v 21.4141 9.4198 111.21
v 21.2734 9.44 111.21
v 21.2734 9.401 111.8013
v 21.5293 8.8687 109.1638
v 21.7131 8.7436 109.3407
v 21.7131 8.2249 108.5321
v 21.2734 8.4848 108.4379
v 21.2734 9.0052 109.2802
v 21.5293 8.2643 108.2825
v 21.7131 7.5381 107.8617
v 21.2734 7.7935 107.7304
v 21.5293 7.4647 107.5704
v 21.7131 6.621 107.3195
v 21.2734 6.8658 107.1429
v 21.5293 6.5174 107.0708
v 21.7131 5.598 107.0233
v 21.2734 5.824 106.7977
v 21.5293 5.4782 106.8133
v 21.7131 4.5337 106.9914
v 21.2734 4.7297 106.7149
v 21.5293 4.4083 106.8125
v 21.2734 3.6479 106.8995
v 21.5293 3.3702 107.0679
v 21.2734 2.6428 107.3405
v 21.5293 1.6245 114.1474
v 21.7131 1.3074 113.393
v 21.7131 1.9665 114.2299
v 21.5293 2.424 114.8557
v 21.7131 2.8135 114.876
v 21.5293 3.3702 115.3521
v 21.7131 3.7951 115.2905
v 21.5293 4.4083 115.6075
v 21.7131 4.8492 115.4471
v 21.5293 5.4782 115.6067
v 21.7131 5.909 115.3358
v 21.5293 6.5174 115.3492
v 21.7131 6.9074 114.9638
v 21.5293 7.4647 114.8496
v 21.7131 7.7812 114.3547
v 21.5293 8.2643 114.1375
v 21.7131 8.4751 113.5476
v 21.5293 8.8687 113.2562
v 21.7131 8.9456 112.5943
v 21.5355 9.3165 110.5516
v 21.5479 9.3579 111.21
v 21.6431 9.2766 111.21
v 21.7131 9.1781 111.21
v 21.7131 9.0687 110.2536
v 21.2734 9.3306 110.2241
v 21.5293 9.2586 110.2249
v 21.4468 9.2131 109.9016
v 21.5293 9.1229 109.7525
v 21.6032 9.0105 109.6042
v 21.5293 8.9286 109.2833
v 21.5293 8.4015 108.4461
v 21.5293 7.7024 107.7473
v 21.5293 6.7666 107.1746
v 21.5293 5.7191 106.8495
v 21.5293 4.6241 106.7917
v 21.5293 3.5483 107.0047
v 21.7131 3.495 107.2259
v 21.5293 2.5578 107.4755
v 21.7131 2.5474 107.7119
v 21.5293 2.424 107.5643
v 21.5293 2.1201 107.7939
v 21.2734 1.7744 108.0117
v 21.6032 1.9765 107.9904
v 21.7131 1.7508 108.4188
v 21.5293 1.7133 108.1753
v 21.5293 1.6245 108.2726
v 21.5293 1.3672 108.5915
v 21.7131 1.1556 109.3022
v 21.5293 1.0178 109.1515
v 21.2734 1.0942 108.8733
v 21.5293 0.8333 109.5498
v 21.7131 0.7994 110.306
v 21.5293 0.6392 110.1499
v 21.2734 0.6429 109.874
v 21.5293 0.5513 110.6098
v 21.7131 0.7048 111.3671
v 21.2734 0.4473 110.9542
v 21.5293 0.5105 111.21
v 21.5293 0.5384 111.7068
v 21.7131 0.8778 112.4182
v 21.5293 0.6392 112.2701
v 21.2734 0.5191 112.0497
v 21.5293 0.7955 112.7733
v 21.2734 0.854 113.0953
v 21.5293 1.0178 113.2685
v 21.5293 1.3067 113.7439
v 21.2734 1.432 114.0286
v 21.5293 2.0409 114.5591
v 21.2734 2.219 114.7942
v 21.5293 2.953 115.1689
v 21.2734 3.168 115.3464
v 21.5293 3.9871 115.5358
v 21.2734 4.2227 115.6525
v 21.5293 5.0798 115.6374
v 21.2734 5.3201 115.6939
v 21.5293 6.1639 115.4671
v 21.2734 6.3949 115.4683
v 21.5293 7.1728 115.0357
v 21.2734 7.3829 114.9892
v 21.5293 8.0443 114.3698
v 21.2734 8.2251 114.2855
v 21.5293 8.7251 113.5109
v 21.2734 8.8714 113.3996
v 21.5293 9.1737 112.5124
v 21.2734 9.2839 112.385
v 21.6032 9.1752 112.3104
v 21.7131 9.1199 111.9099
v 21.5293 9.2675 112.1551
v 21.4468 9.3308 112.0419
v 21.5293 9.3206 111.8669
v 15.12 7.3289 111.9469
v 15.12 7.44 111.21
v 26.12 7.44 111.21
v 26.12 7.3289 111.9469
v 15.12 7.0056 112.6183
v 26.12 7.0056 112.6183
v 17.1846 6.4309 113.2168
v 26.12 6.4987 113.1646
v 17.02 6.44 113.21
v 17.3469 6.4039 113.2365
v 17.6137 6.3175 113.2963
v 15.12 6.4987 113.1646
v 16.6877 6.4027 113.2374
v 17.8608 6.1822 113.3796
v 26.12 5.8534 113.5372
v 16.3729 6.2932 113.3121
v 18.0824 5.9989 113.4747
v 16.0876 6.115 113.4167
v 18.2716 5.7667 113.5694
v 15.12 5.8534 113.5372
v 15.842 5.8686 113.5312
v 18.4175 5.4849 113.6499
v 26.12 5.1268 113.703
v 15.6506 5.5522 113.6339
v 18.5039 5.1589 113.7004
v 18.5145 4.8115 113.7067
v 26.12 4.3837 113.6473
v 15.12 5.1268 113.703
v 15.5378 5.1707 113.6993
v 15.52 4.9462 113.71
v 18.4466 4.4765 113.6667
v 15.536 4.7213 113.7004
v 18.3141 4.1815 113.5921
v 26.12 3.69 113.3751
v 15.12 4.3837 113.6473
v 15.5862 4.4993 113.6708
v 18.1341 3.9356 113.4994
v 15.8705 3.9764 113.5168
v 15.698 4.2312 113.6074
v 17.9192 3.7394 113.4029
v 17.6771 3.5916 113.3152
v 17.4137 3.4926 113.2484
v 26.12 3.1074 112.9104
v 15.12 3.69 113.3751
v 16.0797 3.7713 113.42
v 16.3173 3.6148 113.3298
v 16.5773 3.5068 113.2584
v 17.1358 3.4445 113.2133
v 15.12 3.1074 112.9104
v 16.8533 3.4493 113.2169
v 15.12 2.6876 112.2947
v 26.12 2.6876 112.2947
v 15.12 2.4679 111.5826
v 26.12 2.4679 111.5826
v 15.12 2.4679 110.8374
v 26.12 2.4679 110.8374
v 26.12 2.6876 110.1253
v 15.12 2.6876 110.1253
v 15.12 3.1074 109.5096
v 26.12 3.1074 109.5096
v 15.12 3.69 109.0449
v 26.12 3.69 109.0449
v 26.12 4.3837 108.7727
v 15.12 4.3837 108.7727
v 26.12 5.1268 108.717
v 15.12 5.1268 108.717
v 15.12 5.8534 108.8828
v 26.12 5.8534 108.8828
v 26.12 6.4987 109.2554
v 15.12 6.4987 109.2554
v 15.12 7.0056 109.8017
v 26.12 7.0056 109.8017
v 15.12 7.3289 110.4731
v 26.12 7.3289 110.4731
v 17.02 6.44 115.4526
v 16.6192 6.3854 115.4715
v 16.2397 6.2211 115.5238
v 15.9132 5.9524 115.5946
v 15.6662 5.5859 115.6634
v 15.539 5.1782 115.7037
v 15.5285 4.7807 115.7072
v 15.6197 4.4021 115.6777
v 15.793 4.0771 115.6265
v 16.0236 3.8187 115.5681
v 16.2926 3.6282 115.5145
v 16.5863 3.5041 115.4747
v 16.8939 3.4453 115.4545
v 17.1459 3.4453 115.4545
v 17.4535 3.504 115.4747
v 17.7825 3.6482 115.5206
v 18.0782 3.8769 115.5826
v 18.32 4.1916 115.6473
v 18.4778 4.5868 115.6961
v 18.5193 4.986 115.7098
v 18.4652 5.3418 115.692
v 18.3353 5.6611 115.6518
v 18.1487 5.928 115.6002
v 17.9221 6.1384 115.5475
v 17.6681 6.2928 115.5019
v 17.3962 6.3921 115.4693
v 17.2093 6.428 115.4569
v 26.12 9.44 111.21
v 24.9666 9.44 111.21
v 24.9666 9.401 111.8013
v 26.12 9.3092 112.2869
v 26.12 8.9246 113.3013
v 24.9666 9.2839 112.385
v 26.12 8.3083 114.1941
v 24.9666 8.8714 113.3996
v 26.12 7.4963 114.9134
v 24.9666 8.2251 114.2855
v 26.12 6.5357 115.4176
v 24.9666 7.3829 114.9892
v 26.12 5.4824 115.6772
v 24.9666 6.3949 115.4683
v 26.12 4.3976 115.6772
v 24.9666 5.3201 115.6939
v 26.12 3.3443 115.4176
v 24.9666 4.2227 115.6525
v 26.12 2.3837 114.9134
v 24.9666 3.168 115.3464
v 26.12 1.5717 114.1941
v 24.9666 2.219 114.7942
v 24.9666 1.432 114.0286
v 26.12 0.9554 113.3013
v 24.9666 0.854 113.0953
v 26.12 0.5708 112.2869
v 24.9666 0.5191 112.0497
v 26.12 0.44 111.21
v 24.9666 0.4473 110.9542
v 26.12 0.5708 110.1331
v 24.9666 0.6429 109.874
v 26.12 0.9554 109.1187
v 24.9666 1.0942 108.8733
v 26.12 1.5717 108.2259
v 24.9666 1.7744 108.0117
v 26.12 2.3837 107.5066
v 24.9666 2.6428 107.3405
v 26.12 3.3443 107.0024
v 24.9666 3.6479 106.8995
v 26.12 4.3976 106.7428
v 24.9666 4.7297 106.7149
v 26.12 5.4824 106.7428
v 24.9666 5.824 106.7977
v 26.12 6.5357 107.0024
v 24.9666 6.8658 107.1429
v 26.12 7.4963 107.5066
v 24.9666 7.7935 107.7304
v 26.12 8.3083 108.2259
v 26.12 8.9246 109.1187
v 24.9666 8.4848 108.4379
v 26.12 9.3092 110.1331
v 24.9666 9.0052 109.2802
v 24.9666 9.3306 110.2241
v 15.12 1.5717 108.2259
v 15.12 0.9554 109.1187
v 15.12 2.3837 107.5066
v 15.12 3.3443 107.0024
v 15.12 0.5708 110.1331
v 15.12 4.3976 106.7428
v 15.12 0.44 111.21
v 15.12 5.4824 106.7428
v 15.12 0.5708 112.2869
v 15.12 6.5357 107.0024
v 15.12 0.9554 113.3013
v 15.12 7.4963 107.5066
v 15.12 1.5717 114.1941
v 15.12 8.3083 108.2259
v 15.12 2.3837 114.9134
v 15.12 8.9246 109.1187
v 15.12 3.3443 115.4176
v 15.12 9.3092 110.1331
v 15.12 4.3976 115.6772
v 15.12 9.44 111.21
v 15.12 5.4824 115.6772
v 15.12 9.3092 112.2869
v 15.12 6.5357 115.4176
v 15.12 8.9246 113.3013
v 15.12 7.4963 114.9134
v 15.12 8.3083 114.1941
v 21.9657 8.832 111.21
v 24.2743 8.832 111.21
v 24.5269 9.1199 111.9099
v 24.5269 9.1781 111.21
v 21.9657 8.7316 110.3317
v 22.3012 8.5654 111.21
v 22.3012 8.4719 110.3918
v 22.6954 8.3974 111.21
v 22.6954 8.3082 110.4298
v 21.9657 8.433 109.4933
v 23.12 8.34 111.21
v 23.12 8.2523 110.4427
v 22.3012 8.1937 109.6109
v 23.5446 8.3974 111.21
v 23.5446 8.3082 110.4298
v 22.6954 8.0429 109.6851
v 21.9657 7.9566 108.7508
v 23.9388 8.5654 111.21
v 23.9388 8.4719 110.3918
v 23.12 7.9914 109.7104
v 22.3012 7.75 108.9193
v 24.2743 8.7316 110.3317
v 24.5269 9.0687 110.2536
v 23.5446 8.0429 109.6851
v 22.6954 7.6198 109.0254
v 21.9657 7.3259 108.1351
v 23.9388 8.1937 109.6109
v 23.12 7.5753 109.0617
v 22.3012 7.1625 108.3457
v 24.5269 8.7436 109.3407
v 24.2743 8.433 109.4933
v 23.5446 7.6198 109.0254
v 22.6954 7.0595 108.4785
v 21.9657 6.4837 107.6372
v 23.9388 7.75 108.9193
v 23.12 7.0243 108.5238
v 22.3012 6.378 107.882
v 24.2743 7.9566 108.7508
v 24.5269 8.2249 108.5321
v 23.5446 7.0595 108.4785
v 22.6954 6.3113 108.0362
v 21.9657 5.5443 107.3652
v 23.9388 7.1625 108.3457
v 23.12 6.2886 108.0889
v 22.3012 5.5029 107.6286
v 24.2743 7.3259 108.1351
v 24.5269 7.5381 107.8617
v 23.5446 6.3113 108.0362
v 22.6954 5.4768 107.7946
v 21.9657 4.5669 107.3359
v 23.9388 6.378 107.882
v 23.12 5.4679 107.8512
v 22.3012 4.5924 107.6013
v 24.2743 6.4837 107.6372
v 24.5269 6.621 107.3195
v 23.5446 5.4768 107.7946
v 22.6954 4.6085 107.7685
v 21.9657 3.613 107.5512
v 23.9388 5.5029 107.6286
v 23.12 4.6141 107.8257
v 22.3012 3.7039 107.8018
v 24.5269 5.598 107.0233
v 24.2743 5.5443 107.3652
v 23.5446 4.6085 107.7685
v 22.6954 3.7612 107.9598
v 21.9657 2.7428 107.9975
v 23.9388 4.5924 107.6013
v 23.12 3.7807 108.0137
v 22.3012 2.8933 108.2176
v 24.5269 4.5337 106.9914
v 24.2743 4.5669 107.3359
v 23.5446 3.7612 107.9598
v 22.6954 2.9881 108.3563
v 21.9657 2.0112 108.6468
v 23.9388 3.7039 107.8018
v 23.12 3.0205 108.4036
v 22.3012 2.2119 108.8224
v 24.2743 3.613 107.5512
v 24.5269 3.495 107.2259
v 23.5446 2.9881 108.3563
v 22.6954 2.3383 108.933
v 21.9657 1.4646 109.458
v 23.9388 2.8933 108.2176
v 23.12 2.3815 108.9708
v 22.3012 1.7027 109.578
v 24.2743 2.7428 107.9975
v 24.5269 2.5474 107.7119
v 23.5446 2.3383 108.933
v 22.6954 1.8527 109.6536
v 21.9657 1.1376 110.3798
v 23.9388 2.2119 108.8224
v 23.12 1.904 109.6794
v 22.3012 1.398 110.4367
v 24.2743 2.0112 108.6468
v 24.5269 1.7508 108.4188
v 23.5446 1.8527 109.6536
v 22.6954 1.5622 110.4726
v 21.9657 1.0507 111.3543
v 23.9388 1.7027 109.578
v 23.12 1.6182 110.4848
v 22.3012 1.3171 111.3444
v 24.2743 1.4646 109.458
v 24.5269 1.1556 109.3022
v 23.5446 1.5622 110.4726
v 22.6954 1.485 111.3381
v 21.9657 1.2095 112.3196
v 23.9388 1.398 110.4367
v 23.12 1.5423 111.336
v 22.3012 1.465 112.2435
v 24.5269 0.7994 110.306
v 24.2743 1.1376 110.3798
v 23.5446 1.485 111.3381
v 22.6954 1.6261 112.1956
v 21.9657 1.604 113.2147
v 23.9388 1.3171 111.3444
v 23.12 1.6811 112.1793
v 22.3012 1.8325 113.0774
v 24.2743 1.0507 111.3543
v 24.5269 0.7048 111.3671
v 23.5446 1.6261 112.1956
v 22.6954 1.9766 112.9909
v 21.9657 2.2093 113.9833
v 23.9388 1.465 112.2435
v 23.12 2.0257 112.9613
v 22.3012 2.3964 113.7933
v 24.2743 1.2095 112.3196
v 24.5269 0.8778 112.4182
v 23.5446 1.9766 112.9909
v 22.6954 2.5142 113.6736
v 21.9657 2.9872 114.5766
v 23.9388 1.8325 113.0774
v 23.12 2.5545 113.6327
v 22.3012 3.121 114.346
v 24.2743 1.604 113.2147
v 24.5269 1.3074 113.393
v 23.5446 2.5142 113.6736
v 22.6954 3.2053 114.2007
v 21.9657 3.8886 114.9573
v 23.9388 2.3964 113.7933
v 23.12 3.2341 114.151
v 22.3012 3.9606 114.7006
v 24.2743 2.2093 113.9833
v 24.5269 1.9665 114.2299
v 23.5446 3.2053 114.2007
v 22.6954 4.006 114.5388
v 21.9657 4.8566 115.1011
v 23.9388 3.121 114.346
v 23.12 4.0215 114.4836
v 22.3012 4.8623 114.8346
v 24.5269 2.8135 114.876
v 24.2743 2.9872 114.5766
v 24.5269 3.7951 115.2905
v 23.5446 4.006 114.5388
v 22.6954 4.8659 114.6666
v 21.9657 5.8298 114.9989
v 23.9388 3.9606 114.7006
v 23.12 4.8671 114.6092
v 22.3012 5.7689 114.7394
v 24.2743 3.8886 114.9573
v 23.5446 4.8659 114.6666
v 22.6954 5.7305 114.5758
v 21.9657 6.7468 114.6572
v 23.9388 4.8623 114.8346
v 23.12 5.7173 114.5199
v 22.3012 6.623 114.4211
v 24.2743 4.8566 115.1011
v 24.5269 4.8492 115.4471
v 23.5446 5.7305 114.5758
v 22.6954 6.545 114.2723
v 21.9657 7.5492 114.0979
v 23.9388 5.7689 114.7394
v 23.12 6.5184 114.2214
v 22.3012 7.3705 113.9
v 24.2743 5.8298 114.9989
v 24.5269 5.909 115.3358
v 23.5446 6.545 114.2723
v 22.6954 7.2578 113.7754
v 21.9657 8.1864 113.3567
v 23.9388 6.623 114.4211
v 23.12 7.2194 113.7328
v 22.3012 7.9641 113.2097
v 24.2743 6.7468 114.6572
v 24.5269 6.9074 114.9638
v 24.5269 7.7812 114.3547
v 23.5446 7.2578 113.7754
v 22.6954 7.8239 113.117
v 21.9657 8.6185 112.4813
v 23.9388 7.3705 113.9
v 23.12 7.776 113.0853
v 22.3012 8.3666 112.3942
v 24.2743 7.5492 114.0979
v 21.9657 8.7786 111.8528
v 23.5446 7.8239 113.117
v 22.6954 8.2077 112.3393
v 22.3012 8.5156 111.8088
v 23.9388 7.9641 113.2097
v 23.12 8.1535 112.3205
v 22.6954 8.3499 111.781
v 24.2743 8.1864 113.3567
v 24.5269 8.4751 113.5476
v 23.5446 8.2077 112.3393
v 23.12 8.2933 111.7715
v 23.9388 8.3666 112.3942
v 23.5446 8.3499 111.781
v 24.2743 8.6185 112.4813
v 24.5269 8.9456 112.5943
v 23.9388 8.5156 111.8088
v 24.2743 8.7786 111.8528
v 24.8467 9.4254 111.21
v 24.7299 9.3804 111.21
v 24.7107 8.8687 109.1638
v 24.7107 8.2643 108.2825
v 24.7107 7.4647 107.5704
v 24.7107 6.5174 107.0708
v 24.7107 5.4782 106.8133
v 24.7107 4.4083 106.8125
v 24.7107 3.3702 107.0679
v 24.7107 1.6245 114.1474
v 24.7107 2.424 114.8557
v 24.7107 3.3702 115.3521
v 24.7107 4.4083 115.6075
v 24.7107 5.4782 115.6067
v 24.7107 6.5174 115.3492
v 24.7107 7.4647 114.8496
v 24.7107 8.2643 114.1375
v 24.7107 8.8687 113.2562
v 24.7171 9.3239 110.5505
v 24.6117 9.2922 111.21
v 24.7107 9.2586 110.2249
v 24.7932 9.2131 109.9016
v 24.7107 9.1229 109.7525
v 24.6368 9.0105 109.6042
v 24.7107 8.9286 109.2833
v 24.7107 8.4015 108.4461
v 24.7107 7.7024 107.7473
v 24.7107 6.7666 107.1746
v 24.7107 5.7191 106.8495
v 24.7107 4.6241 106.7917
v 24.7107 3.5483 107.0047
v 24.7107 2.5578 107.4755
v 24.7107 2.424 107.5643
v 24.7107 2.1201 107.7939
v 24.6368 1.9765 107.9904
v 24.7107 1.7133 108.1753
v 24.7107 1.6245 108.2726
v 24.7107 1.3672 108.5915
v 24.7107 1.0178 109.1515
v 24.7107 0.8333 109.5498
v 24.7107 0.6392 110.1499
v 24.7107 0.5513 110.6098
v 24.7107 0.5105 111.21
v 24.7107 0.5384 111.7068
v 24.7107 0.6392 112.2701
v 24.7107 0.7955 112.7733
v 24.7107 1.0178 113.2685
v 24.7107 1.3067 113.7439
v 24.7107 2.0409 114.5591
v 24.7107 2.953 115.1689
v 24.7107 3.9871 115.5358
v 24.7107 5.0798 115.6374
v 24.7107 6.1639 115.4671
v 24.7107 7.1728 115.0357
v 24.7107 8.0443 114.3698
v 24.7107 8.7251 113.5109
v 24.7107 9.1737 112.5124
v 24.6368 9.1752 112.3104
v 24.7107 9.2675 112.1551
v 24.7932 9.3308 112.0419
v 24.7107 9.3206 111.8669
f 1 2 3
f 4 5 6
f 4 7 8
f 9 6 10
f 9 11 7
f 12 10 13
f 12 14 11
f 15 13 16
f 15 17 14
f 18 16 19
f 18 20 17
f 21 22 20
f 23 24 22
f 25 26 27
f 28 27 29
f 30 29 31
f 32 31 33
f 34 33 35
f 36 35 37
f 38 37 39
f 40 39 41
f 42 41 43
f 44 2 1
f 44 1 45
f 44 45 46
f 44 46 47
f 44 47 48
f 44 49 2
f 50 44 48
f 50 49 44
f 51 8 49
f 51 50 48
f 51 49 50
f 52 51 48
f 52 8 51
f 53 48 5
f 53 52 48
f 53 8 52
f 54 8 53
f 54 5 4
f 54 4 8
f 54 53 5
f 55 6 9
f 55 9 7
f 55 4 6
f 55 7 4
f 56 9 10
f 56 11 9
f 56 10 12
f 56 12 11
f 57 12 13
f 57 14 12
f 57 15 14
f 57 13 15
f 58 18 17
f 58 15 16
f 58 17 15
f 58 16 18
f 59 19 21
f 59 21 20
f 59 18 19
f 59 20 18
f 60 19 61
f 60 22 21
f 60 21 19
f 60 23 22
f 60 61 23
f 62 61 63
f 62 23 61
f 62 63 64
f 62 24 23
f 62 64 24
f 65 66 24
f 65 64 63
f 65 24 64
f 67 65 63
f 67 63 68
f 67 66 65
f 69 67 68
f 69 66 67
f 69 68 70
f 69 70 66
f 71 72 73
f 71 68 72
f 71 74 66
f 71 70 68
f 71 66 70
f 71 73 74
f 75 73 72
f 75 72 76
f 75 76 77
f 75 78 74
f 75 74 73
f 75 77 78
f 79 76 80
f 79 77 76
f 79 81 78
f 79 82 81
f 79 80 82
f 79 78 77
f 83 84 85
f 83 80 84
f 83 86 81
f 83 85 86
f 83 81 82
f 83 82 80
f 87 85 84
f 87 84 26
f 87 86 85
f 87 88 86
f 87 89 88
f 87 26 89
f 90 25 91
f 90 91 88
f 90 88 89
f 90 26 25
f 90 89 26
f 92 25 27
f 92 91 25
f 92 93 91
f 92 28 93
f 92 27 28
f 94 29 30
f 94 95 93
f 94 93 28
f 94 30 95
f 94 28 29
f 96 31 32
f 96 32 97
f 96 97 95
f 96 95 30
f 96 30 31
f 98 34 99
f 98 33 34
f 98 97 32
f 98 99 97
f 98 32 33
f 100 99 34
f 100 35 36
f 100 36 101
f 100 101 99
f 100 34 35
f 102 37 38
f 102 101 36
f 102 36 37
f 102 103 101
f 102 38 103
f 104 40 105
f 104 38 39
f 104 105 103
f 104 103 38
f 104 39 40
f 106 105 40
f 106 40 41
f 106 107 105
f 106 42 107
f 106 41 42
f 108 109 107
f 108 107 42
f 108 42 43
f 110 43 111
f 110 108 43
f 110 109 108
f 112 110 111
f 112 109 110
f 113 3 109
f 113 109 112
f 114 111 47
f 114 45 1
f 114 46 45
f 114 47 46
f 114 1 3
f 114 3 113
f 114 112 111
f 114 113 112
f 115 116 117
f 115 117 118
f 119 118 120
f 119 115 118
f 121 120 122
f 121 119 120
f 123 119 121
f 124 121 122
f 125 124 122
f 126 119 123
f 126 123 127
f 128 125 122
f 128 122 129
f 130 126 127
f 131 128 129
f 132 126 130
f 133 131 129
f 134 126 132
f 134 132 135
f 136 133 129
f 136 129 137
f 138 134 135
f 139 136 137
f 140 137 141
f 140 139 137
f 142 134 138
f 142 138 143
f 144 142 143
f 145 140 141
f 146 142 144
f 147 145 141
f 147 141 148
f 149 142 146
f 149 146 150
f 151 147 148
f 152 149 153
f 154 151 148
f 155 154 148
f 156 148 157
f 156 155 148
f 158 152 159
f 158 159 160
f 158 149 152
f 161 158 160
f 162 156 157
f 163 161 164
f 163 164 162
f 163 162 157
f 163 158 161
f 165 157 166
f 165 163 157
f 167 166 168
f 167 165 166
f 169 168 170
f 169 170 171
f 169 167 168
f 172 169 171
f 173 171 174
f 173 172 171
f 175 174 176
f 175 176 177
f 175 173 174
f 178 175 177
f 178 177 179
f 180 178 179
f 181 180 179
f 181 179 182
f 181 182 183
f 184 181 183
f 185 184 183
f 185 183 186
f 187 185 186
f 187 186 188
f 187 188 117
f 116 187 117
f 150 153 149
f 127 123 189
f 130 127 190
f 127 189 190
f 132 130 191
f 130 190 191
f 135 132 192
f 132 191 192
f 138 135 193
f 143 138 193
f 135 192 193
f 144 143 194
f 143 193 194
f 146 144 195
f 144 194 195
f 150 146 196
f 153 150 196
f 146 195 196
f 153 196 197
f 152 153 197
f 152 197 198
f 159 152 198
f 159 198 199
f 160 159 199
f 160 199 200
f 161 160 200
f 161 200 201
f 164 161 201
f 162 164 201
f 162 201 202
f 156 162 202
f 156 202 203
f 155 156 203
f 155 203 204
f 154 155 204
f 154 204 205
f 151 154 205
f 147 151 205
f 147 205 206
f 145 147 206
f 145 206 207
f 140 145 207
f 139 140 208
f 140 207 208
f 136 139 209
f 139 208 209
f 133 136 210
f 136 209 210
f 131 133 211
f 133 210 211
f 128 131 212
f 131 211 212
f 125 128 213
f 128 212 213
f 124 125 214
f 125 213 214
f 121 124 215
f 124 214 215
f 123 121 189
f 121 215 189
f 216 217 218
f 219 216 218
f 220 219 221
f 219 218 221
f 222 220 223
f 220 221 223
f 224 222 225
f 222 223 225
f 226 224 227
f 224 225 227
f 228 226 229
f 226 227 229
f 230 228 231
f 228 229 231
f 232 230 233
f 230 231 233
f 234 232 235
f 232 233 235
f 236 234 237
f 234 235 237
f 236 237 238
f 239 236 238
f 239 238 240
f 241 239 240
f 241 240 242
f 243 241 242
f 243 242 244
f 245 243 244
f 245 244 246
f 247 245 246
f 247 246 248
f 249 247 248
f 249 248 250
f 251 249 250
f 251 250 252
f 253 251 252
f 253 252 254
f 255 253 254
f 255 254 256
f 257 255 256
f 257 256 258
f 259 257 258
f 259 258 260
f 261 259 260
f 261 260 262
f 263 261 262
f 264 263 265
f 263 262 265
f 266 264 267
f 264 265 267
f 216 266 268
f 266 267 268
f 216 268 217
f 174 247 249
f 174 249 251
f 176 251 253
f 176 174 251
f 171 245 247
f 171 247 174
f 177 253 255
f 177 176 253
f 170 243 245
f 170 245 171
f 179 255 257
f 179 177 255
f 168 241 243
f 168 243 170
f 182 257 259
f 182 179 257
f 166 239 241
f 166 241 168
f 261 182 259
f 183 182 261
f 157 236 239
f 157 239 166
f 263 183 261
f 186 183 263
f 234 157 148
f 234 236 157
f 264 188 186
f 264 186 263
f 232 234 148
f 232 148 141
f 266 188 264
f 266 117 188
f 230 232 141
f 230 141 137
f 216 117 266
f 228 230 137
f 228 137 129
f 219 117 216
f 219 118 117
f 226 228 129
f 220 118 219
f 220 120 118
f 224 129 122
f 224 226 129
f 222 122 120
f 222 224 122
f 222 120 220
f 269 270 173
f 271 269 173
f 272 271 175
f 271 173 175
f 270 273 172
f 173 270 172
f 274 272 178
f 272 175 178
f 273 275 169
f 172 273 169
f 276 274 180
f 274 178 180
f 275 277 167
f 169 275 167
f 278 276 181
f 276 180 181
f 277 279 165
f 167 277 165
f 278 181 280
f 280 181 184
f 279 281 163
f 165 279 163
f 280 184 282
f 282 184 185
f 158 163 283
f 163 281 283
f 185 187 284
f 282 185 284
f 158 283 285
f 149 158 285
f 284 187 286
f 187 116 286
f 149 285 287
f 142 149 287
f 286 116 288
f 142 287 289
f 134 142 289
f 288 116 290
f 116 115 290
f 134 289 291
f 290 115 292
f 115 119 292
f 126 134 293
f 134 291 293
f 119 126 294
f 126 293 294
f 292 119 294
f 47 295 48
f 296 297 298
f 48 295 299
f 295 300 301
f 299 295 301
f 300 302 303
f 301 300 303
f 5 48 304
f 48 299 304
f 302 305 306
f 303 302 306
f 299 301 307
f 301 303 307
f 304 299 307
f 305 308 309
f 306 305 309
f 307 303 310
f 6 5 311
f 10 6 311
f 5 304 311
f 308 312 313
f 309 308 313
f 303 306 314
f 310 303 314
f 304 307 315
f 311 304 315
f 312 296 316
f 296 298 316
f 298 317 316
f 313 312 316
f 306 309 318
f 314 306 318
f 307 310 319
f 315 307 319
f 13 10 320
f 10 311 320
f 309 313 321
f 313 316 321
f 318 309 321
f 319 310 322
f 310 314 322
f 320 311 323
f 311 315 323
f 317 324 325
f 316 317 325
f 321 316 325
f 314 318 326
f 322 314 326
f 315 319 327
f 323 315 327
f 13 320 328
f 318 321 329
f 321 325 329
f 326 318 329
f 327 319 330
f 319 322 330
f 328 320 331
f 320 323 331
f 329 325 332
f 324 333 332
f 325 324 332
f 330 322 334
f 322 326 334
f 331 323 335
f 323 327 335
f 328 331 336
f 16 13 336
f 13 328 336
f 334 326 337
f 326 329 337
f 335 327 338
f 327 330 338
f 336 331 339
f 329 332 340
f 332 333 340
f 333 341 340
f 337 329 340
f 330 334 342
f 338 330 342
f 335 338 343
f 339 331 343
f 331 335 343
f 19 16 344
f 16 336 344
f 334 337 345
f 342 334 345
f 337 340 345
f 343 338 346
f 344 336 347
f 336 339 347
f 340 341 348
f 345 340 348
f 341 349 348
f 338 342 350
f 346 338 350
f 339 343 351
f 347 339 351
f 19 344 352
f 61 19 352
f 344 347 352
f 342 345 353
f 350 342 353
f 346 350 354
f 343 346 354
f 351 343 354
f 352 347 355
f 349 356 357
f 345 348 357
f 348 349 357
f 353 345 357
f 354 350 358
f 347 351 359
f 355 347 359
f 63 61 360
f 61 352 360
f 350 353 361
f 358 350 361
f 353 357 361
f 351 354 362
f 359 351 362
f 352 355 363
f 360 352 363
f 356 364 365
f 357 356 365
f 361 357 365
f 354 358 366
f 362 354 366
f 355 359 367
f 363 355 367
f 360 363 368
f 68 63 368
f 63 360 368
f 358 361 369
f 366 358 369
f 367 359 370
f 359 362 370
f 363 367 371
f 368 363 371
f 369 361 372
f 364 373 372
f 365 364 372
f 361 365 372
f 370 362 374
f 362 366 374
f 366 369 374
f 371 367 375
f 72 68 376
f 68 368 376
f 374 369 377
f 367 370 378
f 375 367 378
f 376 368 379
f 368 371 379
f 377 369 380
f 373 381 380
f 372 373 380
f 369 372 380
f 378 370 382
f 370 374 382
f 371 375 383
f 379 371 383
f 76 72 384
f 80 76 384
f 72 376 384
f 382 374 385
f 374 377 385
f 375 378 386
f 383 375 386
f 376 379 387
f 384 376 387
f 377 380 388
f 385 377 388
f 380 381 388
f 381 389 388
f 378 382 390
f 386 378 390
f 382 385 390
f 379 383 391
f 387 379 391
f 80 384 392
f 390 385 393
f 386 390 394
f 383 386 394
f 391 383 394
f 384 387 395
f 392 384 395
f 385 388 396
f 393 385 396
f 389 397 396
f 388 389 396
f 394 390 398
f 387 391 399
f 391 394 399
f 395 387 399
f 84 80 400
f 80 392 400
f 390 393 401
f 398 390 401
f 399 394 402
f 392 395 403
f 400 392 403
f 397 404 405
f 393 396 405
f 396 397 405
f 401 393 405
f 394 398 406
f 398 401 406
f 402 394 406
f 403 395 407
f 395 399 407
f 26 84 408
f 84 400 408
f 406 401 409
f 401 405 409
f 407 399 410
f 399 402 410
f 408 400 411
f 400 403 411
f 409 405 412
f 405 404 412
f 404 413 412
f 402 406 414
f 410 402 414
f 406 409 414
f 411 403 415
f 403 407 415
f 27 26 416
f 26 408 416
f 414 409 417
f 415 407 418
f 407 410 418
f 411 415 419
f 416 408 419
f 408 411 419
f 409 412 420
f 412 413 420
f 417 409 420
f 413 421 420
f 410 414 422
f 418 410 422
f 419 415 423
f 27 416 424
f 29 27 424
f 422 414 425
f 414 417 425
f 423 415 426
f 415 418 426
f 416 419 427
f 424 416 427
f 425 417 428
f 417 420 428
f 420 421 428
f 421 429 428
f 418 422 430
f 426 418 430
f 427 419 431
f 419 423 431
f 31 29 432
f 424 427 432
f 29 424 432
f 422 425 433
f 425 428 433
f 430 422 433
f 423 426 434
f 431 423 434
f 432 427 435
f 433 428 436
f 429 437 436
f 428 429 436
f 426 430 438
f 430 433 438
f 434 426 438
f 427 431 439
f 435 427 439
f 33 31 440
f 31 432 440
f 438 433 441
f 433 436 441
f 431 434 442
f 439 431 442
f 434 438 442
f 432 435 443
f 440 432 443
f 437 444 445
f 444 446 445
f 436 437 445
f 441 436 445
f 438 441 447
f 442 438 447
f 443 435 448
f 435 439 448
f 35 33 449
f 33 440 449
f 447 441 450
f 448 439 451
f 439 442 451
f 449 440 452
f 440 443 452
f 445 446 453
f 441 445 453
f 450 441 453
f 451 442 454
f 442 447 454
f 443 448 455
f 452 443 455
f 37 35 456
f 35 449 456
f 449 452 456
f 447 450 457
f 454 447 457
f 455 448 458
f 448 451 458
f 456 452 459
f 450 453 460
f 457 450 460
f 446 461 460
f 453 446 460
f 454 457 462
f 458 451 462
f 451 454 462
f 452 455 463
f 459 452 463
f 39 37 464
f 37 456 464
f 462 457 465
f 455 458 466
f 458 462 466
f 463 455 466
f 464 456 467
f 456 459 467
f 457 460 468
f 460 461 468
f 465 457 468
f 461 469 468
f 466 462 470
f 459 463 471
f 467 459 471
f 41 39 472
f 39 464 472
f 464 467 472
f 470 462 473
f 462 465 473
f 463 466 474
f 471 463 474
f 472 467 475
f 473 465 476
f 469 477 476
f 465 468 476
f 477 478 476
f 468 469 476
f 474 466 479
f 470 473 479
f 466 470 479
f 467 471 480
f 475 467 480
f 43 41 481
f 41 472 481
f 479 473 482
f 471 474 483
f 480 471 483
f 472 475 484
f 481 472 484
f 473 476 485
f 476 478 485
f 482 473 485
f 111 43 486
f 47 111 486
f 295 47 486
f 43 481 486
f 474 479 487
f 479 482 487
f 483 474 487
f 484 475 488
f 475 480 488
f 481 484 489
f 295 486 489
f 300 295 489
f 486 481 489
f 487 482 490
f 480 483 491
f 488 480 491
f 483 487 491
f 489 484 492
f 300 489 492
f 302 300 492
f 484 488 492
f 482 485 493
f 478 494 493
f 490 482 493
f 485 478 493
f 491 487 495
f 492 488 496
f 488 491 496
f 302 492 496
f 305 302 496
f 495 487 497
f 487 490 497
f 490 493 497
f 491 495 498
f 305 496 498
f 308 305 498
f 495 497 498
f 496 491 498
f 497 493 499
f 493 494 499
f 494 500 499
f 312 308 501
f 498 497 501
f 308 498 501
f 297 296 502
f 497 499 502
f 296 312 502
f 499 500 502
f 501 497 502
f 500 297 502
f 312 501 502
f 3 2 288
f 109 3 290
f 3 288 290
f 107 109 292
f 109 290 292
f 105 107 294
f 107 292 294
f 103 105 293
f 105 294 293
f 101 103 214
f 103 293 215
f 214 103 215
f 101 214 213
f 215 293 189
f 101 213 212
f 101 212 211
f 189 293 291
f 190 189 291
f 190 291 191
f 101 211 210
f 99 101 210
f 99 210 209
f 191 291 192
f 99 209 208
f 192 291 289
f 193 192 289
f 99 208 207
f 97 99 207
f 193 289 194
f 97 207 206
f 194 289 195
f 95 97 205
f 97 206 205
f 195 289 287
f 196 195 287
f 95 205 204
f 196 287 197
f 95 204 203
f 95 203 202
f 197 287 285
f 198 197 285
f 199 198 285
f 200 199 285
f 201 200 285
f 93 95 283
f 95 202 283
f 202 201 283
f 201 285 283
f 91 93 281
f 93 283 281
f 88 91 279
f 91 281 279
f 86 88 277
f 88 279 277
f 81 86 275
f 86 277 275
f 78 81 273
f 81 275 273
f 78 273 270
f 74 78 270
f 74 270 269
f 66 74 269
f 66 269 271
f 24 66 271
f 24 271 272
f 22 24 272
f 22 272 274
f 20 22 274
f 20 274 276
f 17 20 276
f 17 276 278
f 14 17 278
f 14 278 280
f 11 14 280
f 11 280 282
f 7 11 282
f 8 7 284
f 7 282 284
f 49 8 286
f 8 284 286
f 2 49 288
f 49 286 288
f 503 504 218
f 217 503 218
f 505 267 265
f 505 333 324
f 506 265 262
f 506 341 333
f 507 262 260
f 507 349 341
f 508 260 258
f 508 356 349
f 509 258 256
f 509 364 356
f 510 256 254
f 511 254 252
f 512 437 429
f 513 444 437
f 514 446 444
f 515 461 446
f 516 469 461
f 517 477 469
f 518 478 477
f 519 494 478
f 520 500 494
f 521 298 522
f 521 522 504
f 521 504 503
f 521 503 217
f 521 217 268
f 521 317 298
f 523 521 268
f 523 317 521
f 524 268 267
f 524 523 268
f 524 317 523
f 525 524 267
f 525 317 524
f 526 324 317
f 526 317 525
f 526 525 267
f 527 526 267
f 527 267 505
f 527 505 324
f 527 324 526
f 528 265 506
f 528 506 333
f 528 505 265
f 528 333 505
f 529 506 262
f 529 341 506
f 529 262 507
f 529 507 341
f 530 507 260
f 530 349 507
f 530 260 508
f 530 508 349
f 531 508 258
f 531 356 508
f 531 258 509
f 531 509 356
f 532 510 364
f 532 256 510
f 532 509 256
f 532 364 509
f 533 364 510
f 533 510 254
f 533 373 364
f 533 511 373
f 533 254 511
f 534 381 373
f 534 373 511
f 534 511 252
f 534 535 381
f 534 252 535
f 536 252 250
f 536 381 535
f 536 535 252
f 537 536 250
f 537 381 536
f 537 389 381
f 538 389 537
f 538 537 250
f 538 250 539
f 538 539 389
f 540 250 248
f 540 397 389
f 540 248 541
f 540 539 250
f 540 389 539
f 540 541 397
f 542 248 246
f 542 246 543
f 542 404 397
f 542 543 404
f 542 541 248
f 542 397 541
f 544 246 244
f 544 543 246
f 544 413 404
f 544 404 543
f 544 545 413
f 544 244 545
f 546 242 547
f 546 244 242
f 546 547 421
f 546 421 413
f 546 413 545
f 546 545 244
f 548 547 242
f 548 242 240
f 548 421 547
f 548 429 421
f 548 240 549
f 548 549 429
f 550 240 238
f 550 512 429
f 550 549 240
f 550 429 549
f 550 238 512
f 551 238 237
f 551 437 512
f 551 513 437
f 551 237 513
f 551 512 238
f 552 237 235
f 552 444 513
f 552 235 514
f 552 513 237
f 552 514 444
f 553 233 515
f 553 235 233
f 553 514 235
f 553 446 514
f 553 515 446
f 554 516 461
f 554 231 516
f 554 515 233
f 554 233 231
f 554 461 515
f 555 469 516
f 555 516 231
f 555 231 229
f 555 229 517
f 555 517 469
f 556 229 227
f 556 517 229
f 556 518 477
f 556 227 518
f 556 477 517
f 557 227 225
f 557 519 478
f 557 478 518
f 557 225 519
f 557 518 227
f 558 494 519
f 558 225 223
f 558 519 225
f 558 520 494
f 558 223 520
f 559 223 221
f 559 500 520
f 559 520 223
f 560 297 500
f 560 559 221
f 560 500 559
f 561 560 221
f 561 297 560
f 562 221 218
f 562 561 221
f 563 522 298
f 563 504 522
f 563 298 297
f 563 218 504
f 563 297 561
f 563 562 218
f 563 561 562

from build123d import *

# Parameters (mm, degrees)
SKETCH240_R             = 4.5
SKETCH240_R_2           = 2.5
PAD102_DEPTH            = 11
SKETCH241_R             = 1.5
POCKET047_DEPTH         = 5
SKETCH242_R             = 1.6
FILLET_R                = 0.5
BODY010_PLACEMENT_ANGLE = 90


with BuildPart() as part:
    # Sketch240 → Pad102 (new body)
    with BuildSketch(Plane.XZ):
        Circle(SKETCH240_R)
        Circle(SKETCH240_R_2, mode=Mode.SUBTRACT)
    extrude(amount=PAD102_DEPTH)

    # Sketch241 (on DatumPlane) → Pocket047 (cut)
    with BuildSketch(Plane.XY.offset(5)):
        with Locations((0, -1.9)):
            Circle(SKETCH241_R)
    extrude(amount=-POCKET047_DEPTH, mode=Mode.SUBTRACT)

    # Sketch242 (on DatumPlane) → Groove (revolve, cut)
    with BuildSketch(Plane.XY):
        with Locations((5, -8)):
            Circle(SKETCH242_R)
    revolve(axis=Axis((0, 0, 0), (0, 1, 0)), mode=Mode.SUBTRACT)

    # Fillet
    fillet_edges = [part.edges().sort_by_distance(p)[0] for p in [
        (-4.5, -9.519868, 0),
        (-4.5, -6.480132, 0),
    ]]
    fillet(fillet_edges, radius=FILLET_R)


with BuildPart() as part_1:
    # Body010 placement: moved
    add(part.part.moved(Location((15.12, 4.94, 111.21))).rotate(Axis((15.12, 4.94, 111.21), (0, 0, 1)), BODY010_PLACEMENT_ANGLE))


solid = part_1.part
